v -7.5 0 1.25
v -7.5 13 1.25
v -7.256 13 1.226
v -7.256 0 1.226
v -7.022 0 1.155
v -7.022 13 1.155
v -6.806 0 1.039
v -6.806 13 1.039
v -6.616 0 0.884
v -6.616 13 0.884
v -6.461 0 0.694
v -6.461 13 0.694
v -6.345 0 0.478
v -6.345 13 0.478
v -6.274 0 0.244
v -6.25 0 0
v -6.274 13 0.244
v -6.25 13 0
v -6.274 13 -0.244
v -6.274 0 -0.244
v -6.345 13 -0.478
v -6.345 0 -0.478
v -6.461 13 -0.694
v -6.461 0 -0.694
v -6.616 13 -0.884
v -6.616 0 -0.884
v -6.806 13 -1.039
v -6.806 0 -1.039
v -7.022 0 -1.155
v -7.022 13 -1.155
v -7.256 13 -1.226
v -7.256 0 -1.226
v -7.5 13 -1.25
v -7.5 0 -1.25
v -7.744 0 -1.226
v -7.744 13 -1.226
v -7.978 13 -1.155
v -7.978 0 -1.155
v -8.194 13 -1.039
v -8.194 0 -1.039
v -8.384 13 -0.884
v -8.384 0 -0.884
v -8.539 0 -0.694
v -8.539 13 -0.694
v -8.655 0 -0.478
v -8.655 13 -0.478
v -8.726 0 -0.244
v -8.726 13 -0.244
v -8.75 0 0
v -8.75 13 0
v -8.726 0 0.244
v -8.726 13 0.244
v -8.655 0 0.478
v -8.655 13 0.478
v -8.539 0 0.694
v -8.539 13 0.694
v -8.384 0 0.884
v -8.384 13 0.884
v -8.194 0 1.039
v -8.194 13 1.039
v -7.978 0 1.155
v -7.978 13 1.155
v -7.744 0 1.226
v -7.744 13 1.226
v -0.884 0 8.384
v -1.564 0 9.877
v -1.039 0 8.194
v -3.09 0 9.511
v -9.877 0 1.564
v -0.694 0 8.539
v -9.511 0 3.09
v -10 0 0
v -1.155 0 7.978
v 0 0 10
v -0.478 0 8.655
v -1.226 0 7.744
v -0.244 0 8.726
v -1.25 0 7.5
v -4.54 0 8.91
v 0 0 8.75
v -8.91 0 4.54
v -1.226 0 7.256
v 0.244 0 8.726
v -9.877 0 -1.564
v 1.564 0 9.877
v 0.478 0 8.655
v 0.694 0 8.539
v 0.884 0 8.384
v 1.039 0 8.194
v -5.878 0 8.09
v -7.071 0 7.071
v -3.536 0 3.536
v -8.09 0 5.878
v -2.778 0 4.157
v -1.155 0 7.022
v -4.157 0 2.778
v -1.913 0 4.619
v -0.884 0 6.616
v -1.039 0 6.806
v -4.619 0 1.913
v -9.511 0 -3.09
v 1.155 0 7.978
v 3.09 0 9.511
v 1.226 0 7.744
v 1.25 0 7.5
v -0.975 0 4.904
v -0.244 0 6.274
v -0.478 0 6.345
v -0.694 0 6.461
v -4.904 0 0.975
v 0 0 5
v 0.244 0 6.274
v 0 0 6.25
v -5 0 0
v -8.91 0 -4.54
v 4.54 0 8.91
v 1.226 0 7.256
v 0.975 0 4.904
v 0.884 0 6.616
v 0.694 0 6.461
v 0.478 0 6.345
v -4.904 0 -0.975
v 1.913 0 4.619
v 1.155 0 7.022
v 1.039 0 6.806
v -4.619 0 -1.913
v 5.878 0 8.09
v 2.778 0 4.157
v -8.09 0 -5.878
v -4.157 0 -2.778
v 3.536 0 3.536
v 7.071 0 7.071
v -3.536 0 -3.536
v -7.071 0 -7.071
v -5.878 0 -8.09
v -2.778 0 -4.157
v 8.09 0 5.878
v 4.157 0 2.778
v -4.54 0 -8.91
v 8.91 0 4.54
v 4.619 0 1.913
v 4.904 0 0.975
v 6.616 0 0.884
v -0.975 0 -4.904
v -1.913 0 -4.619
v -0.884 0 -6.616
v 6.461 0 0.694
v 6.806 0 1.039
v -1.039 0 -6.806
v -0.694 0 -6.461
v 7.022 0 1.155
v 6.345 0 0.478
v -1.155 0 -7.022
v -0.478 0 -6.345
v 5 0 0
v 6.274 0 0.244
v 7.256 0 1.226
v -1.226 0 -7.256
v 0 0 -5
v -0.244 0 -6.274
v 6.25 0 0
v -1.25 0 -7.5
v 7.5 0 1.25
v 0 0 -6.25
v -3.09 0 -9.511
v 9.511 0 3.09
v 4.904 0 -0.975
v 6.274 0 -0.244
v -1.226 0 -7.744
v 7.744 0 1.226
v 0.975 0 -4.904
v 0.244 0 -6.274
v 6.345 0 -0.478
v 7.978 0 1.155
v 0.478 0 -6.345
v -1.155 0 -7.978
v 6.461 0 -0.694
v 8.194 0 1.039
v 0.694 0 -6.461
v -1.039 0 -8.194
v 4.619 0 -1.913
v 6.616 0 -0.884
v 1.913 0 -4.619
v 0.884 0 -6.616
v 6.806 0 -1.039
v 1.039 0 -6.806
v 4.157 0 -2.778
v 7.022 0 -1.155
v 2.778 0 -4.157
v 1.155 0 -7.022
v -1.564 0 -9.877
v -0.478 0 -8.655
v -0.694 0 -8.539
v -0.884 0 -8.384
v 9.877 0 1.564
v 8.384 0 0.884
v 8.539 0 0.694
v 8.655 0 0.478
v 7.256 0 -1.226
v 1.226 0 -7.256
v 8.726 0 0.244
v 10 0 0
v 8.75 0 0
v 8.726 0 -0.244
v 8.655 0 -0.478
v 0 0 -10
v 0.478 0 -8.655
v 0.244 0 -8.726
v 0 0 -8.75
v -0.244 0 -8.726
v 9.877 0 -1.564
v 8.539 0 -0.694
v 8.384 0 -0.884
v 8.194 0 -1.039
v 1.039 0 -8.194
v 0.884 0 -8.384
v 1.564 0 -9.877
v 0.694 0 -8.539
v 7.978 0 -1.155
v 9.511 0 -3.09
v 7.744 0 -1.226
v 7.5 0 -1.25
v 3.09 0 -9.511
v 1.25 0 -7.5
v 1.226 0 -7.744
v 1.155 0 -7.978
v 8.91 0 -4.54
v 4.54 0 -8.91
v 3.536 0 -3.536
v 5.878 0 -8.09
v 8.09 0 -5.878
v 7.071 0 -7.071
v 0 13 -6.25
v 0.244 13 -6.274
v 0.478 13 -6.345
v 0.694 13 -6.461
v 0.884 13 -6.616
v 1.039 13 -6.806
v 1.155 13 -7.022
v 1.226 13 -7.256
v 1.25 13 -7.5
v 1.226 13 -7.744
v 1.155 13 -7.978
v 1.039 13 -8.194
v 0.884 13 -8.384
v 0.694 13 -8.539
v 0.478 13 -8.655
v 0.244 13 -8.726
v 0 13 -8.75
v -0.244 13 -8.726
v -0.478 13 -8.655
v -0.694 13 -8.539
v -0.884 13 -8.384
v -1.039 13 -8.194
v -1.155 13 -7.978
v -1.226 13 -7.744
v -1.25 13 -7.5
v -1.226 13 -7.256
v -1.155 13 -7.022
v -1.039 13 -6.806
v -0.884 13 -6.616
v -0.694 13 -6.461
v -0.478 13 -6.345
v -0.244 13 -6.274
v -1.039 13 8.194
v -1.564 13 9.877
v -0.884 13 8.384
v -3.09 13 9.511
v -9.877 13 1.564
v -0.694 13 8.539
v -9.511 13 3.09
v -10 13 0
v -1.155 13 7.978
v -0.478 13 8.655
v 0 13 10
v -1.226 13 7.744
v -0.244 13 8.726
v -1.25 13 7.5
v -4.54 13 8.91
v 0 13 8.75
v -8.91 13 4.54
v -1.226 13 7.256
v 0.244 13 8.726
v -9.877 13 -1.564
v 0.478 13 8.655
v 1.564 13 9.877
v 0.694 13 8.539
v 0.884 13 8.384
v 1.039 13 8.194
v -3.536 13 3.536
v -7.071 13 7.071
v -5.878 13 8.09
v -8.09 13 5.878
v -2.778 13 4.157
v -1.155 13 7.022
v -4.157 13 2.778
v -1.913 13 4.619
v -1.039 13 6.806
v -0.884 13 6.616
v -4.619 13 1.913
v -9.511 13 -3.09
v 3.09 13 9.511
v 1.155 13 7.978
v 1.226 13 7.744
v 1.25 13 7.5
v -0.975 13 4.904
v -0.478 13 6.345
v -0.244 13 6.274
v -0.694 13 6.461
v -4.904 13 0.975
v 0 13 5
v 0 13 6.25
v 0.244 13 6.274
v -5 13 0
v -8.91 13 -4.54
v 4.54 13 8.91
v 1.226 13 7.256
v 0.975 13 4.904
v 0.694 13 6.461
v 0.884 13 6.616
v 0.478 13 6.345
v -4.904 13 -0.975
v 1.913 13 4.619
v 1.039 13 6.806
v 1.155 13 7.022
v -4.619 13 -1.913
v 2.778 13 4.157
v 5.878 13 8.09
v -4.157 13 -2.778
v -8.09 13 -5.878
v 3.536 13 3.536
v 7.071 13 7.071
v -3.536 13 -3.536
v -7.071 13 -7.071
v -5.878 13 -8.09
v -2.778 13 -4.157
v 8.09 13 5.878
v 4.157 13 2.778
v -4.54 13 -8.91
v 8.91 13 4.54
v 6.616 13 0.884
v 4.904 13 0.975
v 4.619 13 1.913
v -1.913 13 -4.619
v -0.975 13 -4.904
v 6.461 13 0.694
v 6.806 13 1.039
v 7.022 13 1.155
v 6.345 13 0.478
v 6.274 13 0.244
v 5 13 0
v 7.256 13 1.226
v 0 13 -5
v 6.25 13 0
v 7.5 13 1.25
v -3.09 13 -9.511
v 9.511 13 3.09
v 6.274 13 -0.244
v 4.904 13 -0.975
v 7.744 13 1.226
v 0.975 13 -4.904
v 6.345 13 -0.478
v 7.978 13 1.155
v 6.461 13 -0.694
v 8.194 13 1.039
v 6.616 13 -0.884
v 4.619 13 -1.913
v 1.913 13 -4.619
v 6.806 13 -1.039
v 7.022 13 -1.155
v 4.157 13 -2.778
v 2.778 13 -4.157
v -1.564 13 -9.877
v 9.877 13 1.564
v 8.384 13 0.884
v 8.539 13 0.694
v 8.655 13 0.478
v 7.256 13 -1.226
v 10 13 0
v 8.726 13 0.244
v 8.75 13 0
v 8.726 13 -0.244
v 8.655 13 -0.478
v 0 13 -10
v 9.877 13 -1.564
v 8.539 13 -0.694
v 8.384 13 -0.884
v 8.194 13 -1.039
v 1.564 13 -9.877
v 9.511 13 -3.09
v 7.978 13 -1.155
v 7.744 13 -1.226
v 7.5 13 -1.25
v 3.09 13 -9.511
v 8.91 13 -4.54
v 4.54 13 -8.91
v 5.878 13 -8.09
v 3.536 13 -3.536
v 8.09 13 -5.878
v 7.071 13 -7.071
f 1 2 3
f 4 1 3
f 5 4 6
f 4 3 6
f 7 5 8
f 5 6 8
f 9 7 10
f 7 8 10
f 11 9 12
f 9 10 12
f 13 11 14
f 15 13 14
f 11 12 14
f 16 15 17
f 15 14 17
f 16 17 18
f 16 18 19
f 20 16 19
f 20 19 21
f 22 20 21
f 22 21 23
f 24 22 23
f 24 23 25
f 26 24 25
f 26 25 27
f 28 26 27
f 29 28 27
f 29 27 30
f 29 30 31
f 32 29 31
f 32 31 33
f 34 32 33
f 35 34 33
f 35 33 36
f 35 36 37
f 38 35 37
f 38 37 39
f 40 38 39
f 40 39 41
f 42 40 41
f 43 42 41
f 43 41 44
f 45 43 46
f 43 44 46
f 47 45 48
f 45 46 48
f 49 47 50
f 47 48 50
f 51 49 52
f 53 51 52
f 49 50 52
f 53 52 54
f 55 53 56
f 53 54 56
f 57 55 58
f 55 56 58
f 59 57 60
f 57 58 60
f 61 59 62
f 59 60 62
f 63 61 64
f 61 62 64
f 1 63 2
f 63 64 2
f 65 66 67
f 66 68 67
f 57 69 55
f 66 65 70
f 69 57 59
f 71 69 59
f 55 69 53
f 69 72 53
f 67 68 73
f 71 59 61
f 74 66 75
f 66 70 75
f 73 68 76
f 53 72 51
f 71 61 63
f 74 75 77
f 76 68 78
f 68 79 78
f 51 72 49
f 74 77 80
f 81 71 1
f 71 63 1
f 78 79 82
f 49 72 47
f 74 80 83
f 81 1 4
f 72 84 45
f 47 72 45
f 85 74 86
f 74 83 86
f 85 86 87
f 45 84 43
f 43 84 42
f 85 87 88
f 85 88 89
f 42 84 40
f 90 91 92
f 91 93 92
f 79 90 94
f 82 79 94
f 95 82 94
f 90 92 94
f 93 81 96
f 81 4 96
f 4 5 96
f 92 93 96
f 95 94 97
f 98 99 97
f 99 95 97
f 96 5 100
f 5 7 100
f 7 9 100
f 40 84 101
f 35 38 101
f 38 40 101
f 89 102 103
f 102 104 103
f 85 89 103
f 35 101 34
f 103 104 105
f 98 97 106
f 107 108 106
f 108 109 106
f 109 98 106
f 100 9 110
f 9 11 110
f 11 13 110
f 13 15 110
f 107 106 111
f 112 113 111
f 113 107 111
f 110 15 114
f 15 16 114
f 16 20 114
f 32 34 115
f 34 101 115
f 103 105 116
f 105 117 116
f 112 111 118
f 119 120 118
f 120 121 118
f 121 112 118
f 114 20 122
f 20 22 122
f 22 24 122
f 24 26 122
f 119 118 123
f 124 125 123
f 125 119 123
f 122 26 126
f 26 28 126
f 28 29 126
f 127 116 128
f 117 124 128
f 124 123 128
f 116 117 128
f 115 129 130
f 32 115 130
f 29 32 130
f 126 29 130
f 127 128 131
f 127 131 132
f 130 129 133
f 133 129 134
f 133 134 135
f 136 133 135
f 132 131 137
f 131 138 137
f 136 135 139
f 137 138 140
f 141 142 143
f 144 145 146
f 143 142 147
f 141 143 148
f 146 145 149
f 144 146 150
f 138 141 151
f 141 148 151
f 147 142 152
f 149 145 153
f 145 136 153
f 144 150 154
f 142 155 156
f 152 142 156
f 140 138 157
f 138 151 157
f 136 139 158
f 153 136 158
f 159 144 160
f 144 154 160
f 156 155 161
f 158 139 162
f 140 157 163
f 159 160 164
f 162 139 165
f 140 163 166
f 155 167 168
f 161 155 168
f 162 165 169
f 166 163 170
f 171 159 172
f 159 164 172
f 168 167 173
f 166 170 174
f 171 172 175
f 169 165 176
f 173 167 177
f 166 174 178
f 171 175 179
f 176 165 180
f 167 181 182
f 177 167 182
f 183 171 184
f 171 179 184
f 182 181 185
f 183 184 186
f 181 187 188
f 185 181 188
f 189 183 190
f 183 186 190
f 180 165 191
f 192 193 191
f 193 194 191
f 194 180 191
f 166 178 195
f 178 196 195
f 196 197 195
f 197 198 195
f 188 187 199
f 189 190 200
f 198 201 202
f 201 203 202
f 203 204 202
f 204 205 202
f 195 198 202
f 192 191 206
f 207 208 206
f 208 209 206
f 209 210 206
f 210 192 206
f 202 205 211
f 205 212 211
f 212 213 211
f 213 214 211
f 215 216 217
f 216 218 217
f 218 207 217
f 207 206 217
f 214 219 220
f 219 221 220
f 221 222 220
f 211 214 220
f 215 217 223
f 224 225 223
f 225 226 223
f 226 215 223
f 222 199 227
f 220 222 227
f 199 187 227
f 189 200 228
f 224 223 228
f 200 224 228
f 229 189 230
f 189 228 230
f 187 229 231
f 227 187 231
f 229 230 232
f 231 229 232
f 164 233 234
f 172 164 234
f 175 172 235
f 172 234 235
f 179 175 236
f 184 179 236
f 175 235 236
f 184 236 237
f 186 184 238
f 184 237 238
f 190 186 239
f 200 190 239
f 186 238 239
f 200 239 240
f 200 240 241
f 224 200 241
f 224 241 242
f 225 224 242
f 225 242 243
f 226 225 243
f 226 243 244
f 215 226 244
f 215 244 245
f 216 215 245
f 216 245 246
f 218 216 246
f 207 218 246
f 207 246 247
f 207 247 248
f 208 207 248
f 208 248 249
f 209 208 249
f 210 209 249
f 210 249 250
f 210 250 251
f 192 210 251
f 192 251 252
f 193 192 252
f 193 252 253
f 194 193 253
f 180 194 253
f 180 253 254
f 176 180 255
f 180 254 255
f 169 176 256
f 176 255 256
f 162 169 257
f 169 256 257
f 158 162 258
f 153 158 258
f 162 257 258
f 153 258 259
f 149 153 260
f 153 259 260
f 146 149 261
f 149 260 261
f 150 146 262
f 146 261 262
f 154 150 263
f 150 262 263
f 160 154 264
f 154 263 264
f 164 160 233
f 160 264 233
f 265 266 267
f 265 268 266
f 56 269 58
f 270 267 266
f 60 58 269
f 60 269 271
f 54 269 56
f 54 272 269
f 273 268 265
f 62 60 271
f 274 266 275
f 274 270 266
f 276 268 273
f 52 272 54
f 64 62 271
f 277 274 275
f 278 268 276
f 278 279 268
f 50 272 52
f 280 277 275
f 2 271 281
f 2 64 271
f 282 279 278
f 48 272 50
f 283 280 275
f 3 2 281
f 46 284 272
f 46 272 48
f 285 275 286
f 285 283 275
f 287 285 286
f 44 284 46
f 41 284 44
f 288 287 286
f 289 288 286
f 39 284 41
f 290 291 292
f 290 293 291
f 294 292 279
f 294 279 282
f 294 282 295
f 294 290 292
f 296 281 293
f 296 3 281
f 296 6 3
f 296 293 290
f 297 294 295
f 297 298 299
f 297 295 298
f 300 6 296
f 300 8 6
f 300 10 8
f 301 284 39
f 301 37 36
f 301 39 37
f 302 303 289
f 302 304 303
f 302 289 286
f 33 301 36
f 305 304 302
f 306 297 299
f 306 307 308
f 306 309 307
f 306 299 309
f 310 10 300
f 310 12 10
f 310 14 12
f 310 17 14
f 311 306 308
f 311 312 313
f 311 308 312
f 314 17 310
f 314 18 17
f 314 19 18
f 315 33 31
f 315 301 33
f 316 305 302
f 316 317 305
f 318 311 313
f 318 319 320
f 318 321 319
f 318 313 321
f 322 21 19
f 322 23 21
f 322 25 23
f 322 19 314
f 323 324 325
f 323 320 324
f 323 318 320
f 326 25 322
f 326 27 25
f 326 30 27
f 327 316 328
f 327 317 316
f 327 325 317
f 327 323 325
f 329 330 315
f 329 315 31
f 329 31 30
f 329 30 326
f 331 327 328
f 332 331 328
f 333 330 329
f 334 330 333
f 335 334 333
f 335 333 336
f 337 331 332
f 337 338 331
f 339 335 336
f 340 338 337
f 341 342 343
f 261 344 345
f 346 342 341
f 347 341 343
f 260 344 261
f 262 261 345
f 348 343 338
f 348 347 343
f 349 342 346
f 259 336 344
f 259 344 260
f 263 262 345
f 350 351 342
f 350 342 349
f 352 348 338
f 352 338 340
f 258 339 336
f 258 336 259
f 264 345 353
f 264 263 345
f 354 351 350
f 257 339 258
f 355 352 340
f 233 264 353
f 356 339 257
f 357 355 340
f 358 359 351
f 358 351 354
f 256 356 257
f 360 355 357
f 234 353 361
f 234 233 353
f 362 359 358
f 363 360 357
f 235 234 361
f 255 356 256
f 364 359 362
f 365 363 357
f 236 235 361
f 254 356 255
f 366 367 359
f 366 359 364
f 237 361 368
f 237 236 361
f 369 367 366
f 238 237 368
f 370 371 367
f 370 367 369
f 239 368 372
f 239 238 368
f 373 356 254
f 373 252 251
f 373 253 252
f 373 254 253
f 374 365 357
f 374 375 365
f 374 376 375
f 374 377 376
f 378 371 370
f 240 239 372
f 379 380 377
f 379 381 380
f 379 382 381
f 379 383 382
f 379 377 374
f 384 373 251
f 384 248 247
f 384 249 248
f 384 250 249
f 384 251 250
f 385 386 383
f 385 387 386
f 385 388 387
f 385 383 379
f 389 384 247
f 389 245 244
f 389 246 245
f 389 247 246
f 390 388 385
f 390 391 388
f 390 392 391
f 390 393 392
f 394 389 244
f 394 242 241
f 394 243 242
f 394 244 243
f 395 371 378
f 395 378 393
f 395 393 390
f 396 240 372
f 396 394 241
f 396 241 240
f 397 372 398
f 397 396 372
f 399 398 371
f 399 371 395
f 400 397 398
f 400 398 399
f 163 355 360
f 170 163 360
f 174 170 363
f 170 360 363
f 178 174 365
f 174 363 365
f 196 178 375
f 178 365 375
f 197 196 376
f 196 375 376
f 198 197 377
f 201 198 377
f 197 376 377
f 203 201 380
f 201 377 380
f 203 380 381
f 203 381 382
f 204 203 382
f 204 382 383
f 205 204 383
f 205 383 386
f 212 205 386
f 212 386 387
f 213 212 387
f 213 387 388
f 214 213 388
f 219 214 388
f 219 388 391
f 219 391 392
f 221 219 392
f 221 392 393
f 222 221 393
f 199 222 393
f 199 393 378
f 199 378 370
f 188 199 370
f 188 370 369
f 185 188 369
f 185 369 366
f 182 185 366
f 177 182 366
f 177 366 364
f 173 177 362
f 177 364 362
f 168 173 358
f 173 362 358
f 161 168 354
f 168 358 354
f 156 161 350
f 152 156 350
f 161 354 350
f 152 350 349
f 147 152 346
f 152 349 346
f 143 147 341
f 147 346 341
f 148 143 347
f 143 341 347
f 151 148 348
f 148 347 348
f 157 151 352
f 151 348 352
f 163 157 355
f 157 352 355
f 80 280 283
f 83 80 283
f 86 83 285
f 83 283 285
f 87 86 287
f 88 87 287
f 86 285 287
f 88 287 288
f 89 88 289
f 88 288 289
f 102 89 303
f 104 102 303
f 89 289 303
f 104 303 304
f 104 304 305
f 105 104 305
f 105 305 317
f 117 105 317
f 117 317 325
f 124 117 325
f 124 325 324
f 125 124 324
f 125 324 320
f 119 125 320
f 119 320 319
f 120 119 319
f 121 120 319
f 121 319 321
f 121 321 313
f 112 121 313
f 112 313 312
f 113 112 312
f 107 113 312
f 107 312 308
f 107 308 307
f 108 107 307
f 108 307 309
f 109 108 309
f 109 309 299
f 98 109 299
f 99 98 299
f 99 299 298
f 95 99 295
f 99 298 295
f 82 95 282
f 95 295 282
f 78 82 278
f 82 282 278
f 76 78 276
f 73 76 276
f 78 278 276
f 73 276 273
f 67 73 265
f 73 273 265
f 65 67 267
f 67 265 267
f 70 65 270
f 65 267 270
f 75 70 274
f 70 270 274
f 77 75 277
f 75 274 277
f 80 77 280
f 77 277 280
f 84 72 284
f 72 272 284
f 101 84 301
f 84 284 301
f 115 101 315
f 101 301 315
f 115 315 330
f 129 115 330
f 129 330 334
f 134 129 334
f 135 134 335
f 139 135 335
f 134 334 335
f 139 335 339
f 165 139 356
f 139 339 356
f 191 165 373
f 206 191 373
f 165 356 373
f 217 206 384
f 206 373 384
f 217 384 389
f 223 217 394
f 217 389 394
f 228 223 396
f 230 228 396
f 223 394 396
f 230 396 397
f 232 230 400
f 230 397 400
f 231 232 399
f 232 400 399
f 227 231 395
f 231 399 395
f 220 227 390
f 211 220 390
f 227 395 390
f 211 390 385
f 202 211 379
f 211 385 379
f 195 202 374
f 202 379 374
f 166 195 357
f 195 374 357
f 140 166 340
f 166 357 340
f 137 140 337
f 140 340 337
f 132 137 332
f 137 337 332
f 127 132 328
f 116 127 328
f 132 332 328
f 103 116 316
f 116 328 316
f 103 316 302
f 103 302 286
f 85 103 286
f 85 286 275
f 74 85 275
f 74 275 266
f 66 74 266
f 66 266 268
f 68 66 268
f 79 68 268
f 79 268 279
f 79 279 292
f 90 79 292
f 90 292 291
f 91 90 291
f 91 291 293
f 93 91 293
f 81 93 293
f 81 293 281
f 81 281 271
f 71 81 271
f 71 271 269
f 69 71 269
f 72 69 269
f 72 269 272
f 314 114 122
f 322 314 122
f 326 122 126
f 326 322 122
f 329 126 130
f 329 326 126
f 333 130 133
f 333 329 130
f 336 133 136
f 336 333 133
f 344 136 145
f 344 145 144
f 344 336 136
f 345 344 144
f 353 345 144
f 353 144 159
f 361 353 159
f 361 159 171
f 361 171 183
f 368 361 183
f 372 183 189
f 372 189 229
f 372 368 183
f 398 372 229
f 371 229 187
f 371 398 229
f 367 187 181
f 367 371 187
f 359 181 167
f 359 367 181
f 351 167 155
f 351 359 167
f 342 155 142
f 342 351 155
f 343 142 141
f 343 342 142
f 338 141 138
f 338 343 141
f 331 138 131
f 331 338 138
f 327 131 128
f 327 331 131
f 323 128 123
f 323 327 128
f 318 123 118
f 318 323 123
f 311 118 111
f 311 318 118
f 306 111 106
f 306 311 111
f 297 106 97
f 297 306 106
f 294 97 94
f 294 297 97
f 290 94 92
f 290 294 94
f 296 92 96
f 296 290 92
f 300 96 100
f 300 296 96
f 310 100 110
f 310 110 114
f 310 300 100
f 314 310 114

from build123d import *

# Parameters (mm, degrees)
SKETCH_2_W          = 5
SKETCH_2_H          = 13
SKETCH_4_R          = 1.25
CUT_EXTRUDE_1_DEPTH = 20.209372712


with BuildPart() as part:
    # 草图2 → 旋转1 (revolve)
    with BuildSketch(Plane.XY, mode=Mode.PRIVATE) as revolve_1_sk:
        with Locations((7.5, 6.5)):
            Rectangle(SKETCH_2_W, SKETCH_2_H)
    revolve(revolve_1_sk.sketch.rotate(Axis((0, 13, 0), (0, -1, 0)), 180), axis=Axis((0, 13, 0), (0, -1, 0)))

    # 草图4 → 切除-拉伸1 (cut, through all)
    with BuildSketch(Plane(origin=(0, 13, 0), x_dir=(1, 0, 0), z_dir=(0, 1, 0))):
        with Locations(Location((0, 7.5, 0), (0, 0, 270))):
            Circle(SKETCH_4_R)
        with Locations(Location((7.5, 0, 0), (0, 0, 270))):
            Circle(SKETCH_4_R)
        with Locations(Location((0, -7.5, 0), (0, 0, 270))):
            Circle(SKETCH_4_R)
        with Locations(Location((-7.5, 0, 0), (0, 0, 270))):
            Circle(SKETCH_4_R)
    extrude(amount=-CUT_EXTRUDE_1_DEPTH, mode=Mode.SUBTRACT)


solid = part.part
